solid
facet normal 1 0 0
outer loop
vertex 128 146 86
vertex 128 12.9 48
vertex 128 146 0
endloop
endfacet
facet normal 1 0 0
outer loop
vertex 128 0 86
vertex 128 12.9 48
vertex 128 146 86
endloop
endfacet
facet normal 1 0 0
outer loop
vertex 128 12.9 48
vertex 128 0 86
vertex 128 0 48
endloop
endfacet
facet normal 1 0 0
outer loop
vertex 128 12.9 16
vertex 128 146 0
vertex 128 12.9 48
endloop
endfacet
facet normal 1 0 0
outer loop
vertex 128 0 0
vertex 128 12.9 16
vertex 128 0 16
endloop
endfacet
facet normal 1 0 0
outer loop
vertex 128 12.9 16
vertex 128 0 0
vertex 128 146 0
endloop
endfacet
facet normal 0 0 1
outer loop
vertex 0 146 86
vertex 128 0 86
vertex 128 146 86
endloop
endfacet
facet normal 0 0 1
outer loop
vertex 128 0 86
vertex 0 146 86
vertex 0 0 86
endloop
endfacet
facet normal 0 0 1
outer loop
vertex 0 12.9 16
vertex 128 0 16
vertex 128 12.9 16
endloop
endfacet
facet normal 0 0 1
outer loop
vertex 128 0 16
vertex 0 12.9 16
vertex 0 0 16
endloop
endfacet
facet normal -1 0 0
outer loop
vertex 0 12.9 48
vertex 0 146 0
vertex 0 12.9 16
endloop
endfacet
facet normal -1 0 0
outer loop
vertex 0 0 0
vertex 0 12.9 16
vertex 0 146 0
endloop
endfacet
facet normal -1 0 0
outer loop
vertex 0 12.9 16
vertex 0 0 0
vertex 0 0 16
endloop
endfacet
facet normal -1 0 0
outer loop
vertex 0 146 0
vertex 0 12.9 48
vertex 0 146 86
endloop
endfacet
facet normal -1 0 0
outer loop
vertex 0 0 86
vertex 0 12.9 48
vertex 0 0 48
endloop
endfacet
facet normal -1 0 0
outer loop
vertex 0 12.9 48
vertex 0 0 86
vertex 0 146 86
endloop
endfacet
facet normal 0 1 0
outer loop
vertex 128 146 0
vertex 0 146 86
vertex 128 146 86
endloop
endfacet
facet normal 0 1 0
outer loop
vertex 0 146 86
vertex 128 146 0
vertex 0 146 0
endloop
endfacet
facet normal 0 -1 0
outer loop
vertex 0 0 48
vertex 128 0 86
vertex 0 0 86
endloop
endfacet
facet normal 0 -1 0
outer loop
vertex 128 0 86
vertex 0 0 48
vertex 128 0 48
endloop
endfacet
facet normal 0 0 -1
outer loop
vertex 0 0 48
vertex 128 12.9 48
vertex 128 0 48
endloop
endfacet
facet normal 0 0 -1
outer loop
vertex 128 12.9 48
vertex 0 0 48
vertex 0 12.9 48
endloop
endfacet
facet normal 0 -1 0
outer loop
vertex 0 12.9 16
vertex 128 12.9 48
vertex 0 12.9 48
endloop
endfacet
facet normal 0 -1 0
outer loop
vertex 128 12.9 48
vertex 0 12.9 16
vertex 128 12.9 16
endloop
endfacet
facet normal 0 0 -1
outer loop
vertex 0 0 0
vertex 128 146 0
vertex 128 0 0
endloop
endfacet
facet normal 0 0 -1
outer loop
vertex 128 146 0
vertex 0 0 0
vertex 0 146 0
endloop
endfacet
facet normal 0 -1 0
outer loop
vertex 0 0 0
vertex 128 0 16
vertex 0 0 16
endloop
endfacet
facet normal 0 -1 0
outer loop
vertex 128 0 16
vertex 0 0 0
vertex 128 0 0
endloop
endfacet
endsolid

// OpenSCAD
// A module for the Noctua NH-L12S CPU cooler
// Fan mounted UNDER heatsink (closest to motherboard)
module noctua_nh_l12s() {
    heatsink_w = 128;
    heatsink_d = 146;
    heatsink_h = 70;

    fan_w = 128;
    fan_d = 146;
    fan_h = 16;

    // RAM cutout dimensions (in heatsink)
    ram_cutout_w = 134;
    ram_cutout_d = 13;
    ram_cutout_h = 32;

    union() {
        // Fan (at bottom, closest to motherboard)
        color("tan") {
            cube([fan_w, fan_d, fan_h]);
        }

        // Heatsink (on top of fan)
        color("silver") {
            translate([0, 0, fan_h]) {
                difference() {
                    cube([heatsink_w, heatsink_d, heatsink_h]);
                    // RAM Cutout (from bottom of heatsink)
                    translate([(heatsink_w - ram_cutout_w)/2, -0.1, 0]) {
                        cube([ram_cutout_w, ram_cutout_d, ram_cutout_h]);
                    }
                }
            }
        }
    }
}

// Preview
noctua_nh_l12s();
